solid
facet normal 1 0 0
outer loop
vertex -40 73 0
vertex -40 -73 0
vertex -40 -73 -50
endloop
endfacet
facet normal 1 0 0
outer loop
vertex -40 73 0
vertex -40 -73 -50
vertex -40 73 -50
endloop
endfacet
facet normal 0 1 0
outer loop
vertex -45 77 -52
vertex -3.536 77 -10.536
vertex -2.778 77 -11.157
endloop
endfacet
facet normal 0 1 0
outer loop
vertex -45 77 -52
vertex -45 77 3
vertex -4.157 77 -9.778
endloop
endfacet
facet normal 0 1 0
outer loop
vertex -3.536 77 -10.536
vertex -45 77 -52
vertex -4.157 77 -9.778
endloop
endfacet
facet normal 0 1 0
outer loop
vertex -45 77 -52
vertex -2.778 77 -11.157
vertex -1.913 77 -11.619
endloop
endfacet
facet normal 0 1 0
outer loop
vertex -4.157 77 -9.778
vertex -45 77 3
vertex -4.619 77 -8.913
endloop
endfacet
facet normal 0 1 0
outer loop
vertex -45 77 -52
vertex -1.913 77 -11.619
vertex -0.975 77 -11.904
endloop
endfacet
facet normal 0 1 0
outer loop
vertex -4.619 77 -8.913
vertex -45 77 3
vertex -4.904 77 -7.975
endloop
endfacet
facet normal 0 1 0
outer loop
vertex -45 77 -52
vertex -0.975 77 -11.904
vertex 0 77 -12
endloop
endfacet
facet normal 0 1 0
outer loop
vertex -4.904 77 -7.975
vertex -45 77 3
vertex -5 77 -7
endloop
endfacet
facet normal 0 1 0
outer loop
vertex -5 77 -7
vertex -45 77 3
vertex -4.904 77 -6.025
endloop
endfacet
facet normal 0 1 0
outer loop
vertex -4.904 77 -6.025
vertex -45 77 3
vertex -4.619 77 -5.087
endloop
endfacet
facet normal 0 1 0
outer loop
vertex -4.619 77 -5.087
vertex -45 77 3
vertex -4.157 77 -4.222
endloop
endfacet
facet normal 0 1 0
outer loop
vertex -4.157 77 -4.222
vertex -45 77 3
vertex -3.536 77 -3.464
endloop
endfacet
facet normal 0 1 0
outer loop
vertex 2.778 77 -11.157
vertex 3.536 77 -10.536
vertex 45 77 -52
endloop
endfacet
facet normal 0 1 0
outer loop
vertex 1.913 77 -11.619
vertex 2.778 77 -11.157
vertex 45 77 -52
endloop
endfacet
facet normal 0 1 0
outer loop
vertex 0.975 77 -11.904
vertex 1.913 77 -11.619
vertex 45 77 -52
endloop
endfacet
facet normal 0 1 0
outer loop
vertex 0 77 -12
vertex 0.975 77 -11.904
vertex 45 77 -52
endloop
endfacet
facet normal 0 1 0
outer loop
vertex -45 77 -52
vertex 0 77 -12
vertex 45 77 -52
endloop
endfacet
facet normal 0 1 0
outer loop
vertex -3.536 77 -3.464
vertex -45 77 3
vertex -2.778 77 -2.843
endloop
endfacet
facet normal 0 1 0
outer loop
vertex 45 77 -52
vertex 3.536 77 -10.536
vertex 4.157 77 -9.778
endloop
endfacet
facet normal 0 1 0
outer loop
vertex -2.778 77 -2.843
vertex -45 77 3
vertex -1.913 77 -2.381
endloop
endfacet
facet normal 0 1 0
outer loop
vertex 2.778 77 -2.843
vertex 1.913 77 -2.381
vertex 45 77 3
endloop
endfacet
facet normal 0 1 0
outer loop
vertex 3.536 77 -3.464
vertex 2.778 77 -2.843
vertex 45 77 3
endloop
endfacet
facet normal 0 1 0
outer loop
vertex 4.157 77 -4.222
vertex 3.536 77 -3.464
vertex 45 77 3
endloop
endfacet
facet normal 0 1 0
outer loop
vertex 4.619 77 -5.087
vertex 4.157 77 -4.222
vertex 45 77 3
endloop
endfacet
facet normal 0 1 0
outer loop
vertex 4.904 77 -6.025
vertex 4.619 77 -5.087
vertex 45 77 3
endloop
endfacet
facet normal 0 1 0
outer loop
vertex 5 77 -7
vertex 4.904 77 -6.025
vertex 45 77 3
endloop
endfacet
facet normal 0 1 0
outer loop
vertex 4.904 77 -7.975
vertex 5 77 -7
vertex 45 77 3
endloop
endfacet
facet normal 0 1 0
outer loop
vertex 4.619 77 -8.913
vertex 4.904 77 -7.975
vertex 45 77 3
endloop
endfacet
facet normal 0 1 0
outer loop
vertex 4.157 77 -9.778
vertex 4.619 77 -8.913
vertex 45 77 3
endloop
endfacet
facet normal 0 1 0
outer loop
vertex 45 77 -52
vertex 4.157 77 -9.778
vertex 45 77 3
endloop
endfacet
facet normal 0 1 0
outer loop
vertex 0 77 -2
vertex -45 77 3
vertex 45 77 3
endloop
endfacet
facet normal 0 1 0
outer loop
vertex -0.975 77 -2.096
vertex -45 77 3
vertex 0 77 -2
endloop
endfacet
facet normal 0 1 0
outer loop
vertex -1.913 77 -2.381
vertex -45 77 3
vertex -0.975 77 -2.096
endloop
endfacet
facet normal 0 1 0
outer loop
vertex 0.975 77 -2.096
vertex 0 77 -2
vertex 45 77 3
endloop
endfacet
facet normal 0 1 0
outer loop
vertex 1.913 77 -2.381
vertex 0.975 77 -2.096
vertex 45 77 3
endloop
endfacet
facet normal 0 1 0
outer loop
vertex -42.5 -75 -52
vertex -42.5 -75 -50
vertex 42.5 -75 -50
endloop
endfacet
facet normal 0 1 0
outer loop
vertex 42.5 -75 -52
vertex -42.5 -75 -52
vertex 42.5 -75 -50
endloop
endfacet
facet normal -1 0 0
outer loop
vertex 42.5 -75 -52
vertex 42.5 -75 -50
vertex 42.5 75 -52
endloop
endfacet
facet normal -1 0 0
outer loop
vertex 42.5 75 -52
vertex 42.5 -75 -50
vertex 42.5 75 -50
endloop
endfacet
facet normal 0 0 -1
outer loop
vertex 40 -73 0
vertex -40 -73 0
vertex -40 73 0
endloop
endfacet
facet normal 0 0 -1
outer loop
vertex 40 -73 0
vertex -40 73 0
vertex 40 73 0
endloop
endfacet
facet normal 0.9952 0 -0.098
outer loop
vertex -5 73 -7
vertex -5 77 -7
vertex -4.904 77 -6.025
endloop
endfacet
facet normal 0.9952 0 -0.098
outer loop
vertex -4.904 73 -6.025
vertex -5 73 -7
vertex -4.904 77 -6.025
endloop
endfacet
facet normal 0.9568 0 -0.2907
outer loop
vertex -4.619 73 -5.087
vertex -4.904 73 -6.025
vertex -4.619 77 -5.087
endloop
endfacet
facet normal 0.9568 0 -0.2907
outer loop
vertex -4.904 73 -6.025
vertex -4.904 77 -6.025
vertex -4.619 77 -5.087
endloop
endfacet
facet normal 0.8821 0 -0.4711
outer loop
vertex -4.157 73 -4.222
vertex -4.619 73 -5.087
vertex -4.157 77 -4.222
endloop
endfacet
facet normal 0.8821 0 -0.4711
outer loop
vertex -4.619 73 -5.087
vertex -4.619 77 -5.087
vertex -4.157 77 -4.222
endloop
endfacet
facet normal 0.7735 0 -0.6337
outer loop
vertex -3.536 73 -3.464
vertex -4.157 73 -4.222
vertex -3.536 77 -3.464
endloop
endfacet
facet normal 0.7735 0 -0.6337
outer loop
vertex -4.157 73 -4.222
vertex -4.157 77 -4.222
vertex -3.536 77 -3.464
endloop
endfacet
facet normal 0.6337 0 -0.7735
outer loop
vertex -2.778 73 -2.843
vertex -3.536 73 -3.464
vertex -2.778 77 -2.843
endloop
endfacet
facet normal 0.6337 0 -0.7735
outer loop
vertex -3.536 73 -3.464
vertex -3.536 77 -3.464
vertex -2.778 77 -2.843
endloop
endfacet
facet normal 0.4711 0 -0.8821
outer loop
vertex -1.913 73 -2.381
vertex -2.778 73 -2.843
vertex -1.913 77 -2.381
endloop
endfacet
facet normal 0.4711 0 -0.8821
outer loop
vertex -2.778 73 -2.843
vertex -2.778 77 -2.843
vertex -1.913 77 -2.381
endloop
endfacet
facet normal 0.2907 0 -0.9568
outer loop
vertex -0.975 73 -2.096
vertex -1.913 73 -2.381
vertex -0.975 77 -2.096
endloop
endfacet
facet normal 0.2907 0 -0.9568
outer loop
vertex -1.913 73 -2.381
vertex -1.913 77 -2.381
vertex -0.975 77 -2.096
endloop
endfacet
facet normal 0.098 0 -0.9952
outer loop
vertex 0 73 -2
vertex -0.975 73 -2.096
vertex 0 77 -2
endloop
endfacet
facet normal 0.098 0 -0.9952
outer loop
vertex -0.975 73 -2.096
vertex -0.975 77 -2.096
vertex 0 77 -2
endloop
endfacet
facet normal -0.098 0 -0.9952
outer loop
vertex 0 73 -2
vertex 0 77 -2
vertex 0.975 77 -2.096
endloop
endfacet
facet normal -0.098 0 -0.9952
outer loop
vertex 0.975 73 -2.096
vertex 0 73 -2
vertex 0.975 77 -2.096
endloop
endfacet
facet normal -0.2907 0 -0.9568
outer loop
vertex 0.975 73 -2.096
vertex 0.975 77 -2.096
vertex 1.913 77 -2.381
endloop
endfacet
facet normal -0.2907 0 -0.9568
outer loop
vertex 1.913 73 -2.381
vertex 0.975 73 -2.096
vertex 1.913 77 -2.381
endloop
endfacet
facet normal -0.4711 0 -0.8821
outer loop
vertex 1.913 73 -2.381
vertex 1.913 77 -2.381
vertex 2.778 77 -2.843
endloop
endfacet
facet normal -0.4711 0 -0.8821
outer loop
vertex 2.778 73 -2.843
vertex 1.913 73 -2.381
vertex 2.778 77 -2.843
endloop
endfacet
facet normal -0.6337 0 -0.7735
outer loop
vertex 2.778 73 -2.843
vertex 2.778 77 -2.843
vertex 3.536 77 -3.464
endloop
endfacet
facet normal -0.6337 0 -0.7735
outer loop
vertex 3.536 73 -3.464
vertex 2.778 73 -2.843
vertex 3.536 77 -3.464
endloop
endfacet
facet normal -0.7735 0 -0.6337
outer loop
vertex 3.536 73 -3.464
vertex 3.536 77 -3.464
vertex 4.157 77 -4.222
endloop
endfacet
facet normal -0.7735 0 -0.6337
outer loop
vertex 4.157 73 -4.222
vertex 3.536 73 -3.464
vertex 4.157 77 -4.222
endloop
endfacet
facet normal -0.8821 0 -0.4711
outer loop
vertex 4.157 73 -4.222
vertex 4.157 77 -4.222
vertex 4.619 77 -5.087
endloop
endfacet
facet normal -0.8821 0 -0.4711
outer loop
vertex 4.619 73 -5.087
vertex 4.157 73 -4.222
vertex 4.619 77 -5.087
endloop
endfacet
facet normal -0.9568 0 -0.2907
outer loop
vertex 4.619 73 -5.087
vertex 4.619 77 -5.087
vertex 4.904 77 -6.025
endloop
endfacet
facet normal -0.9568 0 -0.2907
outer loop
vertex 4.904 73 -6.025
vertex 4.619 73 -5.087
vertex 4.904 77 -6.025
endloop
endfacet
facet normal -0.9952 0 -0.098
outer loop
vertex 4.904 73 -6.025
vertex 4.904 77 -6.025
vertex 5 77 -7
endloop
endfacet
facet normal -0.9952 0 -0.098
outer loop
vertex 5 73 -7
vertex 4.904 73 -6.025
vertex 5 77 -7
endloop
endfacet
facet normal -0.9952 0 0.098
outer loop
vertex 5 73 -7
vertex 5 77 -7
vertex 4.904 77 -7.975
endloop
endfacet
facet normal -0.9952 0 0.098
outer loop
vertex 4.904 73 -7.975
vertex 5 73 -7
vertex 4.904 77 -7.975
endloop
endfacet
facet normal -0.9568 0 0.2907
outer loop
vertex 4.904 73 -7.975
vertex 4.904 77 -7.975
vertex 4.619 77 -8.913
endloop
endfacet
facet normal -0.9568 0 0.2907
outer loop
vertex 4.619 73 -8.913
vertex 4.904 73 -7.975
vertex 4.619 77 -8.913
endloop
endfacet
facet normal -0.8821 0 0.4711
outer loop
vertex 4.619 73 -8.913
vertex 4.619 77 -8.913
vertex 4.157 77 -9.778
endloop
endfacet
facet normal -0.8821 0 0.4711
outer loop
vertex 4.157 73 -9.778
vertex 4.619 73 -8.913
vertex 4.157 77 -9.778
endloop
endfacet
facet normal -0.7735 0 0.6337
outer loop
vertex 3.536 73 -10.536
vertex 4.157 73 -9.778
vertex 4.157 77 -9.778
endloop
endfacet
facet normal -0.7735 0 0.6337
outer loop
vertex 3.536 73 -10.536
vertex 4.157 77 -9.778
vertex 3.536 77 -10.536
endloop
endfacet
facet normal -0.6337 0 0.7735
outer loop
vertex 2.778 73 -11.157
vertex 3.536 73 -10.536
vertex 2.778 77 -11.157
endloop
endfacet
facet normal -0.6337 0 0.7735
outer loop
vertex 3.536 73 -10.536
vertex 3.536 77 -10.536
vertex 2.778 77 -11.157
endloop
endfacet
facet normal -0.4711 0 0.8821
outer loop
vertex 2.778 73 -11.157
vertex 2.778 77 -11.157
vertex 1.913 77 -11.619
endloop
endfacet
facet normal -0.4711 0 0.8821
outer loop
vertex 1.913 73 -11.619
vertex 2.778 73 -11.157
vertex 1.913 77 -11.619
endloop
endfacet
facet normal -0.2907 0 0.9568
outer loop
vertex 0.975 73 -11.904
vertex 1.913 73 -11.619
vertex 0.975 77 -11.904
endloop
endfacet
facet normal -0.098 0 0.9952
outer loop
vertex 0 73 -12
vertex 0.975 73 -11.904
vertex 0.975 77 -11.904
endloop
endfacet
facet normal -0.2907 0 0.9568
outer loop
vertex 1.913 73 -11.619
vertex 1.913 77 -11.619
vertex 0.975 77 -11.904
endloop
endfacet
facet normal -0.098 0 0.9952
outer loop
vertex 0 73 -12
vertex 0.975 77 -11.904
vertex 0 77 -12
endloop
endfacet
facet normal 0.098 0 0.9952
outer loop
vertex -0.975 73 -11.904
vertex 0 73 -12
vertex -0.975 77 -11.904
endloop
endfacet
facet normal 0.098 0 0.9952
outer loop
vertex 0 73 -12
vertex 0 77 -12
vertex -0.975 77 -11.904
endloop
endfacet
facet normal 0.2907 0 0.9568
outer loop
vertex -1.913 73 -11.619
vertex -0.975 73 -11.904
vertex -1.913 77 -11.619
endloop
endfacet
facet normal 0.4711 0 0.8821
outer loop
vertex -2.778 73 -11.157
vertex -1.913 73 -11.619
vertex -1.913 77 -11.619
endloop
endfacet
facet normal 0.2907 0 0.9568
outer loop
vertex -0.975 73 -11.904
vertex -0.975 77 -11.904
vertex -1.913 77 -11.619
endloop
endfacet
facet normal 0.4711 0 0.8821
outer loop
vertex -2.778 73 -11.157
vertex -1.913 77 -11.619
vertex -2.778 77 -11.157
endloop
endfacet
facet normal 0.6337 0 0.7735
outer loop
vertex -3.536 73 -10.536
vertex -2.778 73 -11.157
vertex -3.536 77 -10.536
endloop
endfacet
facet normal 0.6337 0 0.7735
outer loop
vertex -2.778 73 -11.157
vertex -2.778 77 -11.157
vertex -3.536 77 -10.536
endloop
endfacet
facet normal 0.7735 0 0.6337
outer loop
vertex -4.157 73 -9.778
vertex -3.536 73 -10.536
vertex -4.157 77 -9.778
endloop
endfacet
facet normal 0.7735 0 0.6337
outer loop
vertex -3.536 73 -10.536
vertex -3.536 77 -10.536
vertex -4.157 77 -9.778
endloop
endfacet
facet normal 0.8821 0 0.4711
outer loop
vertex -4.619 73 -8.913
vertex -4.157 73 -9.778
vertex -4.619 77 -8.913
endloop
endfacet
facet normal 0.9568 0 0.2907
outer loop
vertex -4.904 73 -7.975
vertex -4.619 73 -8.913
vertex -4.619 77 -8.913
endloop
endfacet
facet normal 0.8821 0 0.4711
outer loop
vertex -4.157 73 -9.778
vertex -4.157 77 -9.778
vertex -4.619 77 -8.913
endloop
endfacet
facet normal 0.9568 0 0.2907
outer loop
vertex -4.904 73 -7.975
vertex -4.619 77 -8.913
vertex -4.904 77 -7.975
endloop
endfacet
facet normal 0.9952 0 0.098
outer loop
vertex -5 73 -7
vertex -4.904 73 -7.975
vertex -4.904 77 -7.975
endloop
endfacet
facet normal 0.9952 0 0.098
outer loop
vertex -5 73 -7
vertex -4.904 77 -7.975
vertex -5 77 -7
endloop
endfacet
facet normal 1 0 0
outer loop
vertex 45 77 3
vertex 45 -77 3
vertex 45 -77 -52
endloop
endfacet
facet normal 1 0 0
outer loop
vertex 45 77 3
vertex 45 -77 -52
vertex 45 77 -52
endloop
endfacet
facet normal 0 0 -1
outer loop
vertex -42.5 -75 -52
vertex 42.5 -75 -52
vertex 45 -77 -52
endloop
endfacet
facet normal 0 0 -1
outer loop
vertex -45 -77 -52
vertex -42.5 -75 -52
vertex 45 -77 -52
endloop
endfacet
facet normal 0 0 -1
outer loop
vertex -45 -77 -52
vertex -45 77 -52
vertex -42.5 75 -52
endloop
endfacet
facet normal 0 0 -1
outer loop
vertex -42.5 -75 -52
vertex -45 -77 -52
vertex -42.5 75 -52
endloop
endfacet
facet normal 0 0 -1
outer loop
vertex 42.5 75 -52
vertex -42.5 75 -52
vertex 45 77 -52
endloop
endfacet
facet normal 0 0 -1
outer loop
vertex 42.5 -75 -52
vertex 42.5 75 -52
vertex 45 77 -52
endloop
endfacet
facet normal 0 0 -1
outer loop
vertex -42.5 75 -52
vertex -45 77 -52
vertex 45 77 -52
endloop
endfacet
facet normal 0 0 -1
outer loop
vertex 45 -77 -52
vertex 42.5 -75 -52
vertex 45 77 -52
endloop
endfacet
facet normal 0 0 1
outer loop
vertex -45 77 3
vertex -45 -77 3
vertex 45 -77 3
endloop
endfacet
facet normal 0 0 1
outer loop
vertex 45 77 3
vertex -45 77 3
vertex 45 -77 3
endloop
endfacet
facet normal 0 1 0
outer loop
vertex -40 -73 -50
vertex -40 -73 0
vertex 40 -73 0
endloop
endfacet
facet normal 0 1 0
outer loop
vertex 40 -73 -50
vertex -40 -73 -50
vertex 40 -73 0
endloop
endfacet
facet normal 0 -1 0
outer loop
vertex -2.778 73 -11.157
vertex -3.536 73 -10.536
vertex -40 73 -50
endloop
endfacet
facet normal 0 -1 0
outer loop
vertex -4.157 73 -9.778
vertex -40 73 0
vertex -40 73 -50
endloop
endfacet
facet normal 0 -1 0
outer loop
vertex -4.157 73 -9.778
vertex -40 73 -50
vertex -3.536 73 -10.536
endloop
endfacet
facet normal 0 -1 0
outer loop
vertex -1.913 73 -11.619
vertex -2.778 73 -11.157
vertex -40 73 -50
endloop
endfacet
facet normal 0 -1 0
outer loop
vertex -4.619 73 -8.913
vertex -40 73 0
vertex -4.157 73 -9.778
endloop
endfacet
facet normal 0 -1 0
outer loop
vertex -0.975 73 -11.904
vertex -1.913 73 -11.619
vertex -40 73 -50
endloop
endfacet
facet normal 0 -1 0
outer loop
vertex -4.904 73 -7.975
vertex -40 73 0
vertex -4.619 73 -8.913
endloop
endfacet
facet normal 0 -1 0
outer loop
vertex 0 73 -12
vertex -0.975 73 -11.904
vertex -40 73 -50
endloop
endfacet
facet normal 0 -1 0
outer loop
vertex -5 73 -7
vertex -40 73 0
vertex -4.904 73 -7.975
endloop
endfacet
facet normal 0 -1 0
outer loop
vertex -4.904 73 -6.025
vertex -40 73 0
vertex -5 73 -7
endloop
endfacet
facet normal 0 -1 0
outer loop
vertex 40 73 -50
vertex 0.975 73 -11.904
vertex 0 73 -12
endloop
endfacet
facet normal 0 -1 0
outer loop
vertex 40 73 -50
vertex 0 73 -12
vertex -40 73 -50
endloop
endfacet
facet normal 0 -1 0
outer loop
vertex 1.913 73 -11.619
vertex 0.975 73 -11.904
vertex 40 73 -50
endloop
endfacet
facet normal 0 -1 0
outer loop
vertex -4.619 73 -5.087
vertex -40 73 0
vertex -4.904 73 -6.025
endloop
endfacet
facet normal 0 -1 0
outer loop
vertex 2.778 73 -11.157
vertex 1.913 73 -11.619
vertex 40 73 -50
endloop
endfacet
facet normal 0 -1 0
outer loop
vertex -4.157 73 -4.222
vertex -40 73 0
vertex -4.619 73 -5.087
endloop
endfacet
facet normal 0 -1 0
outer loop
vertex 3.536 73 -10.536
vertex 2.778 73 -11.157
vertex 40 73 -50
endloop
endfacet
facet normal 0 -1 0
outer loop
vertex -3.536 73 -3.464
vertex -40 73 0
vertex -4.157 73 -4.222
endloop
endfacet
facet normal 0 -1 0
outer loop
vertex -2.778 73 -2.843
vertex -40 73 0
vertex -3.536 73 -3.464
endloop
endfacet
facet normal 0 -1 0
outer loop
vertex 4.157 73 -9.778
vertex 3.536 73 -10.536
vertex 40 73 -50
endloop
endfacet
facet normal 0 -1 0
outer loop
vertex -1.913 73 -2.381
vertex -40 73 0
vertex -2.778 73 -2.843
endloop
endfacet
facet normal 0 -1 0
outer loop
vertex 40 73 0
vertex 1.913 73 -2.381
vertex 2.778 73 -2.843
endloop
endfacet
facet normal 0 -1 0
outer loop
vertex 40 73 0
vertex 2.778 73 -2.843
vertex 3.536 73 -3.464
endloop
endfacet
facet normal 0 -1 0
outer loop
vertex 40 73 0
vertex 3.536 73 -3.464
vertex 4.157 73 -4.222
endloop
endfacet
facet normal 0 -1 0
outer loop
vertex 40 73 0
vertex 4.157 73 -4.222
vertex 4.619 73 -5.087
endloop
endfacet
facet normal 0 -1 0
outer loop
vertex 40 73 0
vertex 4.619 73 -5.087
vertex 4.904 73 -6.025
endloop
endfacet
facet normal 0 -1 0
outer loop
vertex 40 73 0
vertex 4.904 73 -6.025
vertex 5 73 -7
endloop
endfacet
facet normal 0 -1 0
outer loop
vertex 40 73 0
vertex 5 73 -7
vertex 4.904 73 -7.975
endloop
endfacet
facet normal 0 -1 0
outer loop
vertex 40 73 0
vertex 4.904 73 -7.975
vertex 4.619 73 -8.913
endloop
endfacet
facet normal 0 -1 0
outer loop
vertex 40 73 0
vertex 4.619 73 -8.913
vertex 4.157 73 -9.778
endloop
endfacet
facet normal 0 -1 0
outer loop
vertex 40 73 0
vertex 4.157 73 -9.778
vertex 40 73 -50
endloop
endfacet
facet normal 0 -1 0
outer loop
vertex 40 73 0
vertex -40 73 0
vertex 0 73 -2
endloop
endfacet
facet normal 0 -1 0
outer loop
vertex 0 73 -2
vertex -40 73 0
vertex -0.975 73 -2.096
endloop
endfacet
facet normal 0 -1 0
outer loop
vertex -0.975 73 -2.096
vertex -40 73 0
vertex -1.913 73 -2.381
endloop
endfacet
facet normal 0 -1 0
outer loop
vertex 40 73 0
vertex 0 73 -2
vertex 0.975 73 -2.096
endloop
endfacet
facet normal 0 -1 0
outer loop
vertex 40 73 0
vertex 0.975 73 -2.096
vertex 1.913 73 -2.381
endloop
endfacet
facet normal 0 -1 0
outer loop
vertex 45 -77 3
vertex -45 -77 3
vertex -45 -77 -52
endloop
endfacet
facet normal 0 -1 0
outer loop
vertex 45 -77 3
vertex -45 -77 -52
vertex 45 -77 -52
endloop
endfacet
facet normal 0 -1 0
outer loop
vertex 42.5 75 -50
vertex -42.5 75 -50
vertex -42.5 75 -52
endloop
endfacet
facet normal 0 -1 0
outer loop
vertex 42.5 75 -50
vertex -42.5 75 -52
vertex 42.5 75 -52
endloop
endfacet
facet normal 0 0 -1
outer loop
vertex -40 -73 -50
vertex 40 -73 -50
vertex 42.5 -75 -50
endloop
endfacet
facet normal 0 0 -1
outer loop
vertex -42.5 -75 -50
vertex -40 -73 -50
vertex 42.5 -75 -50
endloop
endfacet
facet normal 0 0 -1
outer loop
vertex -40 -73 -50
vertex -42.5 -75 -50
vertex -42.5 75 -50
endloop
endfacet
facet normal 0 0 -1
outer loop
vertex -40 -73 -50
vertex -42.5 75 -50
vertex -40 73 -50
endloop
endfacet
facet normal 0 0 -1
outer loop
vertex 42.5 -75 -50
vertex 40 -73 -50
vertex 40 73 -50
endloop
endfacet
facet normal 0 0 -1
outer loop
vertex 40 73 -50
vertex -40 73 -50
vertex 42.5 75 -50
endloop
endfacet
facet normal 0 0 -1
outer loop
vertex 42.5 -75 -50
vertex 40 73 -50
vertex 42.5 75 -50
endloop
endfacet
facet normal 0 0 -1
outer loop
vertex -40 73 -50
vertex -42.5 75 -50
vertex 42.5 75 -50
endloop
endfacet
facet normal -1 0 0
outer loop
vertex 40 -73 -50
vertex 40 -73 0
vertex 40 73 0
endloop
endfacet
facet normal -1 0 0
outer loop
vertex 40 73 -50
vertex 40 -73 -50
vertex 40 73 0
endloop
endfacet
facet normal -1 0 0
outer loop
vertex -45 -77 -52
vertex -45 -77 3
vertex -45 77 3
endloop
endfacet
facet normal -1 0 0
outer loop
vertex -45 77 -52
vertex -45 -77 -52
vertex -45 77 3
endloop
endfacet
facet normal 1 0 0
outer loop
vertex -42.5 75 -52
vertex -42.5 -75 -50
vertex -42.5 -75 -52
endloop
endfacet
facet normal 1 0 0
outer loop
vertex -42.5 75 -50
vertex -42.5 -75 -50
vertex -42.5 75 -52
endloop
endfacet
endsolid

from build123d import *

# Parameters (mm, degrees)
F0_W     = 90
F0_H     = 154
F0_W_2   = 85
F0_H_2   = 150
F0_W_3   = 80
F0_H_3   = 146
F1_DEPTH = 3
F2_DEPTH = 50
F3_DEPTH = 52
F4_R     = 5
F5_DEPTH = 5


with BuildPart() as f1:
    # F0 (on Top) → F1 (new body)
    with BuildSketch(Plane.XY):
        Rectangle(F0_W, F0_H)
        Rectangle(F0_W_2, F0_H_2, mode=Mode.SUBTRACT)
        Rectangle(F0_W_2, F0_H_2)
        Rectangle(F0_W_3, F0_H_3, mode=Mode.SUBTRACT)
        Rectangle(F0_W_3, F0_H_3)
    extrude(amount=F1_DEPTH)

    # F0 (on Top) → F2 (join)
    with BuildSketch(Plane.XY):
        Rectangle(F0_W, F0_H)
        Rectangle(F0_W_2, F0_H_2, mode=Mode.SUBTRACT)
        Rectangle(F0_W_2, F0_H_2)
        Rectangle(F0_W_3, F0_H_3, mode=Mode.SUBTRACT)
    extrude(amount=-F2_DEPTH)

    # F0 (on Top) → F3 (join)
    with BuildSketch(Plane.XY):
        Rectangle(F0_W, F0_H)
        Rectangle(F0_W_2, F0_H_2, mode=Mode.SUBTRACT)
    extrude(amount=-F3_DEPTH)

    # F4 (on face) → F5 (cut)
    with BuildSketch(Plane(origin=(0, 77, 0), x_dir=(-1, 0, 0), z_dir=(0, 1, 0))):
        with Locations((0, -7)):
            Circle(F4_R)
    extrude(amount=-F5_DEPTH, mode=Mode.SUBTRACT)


solid = f1.part
